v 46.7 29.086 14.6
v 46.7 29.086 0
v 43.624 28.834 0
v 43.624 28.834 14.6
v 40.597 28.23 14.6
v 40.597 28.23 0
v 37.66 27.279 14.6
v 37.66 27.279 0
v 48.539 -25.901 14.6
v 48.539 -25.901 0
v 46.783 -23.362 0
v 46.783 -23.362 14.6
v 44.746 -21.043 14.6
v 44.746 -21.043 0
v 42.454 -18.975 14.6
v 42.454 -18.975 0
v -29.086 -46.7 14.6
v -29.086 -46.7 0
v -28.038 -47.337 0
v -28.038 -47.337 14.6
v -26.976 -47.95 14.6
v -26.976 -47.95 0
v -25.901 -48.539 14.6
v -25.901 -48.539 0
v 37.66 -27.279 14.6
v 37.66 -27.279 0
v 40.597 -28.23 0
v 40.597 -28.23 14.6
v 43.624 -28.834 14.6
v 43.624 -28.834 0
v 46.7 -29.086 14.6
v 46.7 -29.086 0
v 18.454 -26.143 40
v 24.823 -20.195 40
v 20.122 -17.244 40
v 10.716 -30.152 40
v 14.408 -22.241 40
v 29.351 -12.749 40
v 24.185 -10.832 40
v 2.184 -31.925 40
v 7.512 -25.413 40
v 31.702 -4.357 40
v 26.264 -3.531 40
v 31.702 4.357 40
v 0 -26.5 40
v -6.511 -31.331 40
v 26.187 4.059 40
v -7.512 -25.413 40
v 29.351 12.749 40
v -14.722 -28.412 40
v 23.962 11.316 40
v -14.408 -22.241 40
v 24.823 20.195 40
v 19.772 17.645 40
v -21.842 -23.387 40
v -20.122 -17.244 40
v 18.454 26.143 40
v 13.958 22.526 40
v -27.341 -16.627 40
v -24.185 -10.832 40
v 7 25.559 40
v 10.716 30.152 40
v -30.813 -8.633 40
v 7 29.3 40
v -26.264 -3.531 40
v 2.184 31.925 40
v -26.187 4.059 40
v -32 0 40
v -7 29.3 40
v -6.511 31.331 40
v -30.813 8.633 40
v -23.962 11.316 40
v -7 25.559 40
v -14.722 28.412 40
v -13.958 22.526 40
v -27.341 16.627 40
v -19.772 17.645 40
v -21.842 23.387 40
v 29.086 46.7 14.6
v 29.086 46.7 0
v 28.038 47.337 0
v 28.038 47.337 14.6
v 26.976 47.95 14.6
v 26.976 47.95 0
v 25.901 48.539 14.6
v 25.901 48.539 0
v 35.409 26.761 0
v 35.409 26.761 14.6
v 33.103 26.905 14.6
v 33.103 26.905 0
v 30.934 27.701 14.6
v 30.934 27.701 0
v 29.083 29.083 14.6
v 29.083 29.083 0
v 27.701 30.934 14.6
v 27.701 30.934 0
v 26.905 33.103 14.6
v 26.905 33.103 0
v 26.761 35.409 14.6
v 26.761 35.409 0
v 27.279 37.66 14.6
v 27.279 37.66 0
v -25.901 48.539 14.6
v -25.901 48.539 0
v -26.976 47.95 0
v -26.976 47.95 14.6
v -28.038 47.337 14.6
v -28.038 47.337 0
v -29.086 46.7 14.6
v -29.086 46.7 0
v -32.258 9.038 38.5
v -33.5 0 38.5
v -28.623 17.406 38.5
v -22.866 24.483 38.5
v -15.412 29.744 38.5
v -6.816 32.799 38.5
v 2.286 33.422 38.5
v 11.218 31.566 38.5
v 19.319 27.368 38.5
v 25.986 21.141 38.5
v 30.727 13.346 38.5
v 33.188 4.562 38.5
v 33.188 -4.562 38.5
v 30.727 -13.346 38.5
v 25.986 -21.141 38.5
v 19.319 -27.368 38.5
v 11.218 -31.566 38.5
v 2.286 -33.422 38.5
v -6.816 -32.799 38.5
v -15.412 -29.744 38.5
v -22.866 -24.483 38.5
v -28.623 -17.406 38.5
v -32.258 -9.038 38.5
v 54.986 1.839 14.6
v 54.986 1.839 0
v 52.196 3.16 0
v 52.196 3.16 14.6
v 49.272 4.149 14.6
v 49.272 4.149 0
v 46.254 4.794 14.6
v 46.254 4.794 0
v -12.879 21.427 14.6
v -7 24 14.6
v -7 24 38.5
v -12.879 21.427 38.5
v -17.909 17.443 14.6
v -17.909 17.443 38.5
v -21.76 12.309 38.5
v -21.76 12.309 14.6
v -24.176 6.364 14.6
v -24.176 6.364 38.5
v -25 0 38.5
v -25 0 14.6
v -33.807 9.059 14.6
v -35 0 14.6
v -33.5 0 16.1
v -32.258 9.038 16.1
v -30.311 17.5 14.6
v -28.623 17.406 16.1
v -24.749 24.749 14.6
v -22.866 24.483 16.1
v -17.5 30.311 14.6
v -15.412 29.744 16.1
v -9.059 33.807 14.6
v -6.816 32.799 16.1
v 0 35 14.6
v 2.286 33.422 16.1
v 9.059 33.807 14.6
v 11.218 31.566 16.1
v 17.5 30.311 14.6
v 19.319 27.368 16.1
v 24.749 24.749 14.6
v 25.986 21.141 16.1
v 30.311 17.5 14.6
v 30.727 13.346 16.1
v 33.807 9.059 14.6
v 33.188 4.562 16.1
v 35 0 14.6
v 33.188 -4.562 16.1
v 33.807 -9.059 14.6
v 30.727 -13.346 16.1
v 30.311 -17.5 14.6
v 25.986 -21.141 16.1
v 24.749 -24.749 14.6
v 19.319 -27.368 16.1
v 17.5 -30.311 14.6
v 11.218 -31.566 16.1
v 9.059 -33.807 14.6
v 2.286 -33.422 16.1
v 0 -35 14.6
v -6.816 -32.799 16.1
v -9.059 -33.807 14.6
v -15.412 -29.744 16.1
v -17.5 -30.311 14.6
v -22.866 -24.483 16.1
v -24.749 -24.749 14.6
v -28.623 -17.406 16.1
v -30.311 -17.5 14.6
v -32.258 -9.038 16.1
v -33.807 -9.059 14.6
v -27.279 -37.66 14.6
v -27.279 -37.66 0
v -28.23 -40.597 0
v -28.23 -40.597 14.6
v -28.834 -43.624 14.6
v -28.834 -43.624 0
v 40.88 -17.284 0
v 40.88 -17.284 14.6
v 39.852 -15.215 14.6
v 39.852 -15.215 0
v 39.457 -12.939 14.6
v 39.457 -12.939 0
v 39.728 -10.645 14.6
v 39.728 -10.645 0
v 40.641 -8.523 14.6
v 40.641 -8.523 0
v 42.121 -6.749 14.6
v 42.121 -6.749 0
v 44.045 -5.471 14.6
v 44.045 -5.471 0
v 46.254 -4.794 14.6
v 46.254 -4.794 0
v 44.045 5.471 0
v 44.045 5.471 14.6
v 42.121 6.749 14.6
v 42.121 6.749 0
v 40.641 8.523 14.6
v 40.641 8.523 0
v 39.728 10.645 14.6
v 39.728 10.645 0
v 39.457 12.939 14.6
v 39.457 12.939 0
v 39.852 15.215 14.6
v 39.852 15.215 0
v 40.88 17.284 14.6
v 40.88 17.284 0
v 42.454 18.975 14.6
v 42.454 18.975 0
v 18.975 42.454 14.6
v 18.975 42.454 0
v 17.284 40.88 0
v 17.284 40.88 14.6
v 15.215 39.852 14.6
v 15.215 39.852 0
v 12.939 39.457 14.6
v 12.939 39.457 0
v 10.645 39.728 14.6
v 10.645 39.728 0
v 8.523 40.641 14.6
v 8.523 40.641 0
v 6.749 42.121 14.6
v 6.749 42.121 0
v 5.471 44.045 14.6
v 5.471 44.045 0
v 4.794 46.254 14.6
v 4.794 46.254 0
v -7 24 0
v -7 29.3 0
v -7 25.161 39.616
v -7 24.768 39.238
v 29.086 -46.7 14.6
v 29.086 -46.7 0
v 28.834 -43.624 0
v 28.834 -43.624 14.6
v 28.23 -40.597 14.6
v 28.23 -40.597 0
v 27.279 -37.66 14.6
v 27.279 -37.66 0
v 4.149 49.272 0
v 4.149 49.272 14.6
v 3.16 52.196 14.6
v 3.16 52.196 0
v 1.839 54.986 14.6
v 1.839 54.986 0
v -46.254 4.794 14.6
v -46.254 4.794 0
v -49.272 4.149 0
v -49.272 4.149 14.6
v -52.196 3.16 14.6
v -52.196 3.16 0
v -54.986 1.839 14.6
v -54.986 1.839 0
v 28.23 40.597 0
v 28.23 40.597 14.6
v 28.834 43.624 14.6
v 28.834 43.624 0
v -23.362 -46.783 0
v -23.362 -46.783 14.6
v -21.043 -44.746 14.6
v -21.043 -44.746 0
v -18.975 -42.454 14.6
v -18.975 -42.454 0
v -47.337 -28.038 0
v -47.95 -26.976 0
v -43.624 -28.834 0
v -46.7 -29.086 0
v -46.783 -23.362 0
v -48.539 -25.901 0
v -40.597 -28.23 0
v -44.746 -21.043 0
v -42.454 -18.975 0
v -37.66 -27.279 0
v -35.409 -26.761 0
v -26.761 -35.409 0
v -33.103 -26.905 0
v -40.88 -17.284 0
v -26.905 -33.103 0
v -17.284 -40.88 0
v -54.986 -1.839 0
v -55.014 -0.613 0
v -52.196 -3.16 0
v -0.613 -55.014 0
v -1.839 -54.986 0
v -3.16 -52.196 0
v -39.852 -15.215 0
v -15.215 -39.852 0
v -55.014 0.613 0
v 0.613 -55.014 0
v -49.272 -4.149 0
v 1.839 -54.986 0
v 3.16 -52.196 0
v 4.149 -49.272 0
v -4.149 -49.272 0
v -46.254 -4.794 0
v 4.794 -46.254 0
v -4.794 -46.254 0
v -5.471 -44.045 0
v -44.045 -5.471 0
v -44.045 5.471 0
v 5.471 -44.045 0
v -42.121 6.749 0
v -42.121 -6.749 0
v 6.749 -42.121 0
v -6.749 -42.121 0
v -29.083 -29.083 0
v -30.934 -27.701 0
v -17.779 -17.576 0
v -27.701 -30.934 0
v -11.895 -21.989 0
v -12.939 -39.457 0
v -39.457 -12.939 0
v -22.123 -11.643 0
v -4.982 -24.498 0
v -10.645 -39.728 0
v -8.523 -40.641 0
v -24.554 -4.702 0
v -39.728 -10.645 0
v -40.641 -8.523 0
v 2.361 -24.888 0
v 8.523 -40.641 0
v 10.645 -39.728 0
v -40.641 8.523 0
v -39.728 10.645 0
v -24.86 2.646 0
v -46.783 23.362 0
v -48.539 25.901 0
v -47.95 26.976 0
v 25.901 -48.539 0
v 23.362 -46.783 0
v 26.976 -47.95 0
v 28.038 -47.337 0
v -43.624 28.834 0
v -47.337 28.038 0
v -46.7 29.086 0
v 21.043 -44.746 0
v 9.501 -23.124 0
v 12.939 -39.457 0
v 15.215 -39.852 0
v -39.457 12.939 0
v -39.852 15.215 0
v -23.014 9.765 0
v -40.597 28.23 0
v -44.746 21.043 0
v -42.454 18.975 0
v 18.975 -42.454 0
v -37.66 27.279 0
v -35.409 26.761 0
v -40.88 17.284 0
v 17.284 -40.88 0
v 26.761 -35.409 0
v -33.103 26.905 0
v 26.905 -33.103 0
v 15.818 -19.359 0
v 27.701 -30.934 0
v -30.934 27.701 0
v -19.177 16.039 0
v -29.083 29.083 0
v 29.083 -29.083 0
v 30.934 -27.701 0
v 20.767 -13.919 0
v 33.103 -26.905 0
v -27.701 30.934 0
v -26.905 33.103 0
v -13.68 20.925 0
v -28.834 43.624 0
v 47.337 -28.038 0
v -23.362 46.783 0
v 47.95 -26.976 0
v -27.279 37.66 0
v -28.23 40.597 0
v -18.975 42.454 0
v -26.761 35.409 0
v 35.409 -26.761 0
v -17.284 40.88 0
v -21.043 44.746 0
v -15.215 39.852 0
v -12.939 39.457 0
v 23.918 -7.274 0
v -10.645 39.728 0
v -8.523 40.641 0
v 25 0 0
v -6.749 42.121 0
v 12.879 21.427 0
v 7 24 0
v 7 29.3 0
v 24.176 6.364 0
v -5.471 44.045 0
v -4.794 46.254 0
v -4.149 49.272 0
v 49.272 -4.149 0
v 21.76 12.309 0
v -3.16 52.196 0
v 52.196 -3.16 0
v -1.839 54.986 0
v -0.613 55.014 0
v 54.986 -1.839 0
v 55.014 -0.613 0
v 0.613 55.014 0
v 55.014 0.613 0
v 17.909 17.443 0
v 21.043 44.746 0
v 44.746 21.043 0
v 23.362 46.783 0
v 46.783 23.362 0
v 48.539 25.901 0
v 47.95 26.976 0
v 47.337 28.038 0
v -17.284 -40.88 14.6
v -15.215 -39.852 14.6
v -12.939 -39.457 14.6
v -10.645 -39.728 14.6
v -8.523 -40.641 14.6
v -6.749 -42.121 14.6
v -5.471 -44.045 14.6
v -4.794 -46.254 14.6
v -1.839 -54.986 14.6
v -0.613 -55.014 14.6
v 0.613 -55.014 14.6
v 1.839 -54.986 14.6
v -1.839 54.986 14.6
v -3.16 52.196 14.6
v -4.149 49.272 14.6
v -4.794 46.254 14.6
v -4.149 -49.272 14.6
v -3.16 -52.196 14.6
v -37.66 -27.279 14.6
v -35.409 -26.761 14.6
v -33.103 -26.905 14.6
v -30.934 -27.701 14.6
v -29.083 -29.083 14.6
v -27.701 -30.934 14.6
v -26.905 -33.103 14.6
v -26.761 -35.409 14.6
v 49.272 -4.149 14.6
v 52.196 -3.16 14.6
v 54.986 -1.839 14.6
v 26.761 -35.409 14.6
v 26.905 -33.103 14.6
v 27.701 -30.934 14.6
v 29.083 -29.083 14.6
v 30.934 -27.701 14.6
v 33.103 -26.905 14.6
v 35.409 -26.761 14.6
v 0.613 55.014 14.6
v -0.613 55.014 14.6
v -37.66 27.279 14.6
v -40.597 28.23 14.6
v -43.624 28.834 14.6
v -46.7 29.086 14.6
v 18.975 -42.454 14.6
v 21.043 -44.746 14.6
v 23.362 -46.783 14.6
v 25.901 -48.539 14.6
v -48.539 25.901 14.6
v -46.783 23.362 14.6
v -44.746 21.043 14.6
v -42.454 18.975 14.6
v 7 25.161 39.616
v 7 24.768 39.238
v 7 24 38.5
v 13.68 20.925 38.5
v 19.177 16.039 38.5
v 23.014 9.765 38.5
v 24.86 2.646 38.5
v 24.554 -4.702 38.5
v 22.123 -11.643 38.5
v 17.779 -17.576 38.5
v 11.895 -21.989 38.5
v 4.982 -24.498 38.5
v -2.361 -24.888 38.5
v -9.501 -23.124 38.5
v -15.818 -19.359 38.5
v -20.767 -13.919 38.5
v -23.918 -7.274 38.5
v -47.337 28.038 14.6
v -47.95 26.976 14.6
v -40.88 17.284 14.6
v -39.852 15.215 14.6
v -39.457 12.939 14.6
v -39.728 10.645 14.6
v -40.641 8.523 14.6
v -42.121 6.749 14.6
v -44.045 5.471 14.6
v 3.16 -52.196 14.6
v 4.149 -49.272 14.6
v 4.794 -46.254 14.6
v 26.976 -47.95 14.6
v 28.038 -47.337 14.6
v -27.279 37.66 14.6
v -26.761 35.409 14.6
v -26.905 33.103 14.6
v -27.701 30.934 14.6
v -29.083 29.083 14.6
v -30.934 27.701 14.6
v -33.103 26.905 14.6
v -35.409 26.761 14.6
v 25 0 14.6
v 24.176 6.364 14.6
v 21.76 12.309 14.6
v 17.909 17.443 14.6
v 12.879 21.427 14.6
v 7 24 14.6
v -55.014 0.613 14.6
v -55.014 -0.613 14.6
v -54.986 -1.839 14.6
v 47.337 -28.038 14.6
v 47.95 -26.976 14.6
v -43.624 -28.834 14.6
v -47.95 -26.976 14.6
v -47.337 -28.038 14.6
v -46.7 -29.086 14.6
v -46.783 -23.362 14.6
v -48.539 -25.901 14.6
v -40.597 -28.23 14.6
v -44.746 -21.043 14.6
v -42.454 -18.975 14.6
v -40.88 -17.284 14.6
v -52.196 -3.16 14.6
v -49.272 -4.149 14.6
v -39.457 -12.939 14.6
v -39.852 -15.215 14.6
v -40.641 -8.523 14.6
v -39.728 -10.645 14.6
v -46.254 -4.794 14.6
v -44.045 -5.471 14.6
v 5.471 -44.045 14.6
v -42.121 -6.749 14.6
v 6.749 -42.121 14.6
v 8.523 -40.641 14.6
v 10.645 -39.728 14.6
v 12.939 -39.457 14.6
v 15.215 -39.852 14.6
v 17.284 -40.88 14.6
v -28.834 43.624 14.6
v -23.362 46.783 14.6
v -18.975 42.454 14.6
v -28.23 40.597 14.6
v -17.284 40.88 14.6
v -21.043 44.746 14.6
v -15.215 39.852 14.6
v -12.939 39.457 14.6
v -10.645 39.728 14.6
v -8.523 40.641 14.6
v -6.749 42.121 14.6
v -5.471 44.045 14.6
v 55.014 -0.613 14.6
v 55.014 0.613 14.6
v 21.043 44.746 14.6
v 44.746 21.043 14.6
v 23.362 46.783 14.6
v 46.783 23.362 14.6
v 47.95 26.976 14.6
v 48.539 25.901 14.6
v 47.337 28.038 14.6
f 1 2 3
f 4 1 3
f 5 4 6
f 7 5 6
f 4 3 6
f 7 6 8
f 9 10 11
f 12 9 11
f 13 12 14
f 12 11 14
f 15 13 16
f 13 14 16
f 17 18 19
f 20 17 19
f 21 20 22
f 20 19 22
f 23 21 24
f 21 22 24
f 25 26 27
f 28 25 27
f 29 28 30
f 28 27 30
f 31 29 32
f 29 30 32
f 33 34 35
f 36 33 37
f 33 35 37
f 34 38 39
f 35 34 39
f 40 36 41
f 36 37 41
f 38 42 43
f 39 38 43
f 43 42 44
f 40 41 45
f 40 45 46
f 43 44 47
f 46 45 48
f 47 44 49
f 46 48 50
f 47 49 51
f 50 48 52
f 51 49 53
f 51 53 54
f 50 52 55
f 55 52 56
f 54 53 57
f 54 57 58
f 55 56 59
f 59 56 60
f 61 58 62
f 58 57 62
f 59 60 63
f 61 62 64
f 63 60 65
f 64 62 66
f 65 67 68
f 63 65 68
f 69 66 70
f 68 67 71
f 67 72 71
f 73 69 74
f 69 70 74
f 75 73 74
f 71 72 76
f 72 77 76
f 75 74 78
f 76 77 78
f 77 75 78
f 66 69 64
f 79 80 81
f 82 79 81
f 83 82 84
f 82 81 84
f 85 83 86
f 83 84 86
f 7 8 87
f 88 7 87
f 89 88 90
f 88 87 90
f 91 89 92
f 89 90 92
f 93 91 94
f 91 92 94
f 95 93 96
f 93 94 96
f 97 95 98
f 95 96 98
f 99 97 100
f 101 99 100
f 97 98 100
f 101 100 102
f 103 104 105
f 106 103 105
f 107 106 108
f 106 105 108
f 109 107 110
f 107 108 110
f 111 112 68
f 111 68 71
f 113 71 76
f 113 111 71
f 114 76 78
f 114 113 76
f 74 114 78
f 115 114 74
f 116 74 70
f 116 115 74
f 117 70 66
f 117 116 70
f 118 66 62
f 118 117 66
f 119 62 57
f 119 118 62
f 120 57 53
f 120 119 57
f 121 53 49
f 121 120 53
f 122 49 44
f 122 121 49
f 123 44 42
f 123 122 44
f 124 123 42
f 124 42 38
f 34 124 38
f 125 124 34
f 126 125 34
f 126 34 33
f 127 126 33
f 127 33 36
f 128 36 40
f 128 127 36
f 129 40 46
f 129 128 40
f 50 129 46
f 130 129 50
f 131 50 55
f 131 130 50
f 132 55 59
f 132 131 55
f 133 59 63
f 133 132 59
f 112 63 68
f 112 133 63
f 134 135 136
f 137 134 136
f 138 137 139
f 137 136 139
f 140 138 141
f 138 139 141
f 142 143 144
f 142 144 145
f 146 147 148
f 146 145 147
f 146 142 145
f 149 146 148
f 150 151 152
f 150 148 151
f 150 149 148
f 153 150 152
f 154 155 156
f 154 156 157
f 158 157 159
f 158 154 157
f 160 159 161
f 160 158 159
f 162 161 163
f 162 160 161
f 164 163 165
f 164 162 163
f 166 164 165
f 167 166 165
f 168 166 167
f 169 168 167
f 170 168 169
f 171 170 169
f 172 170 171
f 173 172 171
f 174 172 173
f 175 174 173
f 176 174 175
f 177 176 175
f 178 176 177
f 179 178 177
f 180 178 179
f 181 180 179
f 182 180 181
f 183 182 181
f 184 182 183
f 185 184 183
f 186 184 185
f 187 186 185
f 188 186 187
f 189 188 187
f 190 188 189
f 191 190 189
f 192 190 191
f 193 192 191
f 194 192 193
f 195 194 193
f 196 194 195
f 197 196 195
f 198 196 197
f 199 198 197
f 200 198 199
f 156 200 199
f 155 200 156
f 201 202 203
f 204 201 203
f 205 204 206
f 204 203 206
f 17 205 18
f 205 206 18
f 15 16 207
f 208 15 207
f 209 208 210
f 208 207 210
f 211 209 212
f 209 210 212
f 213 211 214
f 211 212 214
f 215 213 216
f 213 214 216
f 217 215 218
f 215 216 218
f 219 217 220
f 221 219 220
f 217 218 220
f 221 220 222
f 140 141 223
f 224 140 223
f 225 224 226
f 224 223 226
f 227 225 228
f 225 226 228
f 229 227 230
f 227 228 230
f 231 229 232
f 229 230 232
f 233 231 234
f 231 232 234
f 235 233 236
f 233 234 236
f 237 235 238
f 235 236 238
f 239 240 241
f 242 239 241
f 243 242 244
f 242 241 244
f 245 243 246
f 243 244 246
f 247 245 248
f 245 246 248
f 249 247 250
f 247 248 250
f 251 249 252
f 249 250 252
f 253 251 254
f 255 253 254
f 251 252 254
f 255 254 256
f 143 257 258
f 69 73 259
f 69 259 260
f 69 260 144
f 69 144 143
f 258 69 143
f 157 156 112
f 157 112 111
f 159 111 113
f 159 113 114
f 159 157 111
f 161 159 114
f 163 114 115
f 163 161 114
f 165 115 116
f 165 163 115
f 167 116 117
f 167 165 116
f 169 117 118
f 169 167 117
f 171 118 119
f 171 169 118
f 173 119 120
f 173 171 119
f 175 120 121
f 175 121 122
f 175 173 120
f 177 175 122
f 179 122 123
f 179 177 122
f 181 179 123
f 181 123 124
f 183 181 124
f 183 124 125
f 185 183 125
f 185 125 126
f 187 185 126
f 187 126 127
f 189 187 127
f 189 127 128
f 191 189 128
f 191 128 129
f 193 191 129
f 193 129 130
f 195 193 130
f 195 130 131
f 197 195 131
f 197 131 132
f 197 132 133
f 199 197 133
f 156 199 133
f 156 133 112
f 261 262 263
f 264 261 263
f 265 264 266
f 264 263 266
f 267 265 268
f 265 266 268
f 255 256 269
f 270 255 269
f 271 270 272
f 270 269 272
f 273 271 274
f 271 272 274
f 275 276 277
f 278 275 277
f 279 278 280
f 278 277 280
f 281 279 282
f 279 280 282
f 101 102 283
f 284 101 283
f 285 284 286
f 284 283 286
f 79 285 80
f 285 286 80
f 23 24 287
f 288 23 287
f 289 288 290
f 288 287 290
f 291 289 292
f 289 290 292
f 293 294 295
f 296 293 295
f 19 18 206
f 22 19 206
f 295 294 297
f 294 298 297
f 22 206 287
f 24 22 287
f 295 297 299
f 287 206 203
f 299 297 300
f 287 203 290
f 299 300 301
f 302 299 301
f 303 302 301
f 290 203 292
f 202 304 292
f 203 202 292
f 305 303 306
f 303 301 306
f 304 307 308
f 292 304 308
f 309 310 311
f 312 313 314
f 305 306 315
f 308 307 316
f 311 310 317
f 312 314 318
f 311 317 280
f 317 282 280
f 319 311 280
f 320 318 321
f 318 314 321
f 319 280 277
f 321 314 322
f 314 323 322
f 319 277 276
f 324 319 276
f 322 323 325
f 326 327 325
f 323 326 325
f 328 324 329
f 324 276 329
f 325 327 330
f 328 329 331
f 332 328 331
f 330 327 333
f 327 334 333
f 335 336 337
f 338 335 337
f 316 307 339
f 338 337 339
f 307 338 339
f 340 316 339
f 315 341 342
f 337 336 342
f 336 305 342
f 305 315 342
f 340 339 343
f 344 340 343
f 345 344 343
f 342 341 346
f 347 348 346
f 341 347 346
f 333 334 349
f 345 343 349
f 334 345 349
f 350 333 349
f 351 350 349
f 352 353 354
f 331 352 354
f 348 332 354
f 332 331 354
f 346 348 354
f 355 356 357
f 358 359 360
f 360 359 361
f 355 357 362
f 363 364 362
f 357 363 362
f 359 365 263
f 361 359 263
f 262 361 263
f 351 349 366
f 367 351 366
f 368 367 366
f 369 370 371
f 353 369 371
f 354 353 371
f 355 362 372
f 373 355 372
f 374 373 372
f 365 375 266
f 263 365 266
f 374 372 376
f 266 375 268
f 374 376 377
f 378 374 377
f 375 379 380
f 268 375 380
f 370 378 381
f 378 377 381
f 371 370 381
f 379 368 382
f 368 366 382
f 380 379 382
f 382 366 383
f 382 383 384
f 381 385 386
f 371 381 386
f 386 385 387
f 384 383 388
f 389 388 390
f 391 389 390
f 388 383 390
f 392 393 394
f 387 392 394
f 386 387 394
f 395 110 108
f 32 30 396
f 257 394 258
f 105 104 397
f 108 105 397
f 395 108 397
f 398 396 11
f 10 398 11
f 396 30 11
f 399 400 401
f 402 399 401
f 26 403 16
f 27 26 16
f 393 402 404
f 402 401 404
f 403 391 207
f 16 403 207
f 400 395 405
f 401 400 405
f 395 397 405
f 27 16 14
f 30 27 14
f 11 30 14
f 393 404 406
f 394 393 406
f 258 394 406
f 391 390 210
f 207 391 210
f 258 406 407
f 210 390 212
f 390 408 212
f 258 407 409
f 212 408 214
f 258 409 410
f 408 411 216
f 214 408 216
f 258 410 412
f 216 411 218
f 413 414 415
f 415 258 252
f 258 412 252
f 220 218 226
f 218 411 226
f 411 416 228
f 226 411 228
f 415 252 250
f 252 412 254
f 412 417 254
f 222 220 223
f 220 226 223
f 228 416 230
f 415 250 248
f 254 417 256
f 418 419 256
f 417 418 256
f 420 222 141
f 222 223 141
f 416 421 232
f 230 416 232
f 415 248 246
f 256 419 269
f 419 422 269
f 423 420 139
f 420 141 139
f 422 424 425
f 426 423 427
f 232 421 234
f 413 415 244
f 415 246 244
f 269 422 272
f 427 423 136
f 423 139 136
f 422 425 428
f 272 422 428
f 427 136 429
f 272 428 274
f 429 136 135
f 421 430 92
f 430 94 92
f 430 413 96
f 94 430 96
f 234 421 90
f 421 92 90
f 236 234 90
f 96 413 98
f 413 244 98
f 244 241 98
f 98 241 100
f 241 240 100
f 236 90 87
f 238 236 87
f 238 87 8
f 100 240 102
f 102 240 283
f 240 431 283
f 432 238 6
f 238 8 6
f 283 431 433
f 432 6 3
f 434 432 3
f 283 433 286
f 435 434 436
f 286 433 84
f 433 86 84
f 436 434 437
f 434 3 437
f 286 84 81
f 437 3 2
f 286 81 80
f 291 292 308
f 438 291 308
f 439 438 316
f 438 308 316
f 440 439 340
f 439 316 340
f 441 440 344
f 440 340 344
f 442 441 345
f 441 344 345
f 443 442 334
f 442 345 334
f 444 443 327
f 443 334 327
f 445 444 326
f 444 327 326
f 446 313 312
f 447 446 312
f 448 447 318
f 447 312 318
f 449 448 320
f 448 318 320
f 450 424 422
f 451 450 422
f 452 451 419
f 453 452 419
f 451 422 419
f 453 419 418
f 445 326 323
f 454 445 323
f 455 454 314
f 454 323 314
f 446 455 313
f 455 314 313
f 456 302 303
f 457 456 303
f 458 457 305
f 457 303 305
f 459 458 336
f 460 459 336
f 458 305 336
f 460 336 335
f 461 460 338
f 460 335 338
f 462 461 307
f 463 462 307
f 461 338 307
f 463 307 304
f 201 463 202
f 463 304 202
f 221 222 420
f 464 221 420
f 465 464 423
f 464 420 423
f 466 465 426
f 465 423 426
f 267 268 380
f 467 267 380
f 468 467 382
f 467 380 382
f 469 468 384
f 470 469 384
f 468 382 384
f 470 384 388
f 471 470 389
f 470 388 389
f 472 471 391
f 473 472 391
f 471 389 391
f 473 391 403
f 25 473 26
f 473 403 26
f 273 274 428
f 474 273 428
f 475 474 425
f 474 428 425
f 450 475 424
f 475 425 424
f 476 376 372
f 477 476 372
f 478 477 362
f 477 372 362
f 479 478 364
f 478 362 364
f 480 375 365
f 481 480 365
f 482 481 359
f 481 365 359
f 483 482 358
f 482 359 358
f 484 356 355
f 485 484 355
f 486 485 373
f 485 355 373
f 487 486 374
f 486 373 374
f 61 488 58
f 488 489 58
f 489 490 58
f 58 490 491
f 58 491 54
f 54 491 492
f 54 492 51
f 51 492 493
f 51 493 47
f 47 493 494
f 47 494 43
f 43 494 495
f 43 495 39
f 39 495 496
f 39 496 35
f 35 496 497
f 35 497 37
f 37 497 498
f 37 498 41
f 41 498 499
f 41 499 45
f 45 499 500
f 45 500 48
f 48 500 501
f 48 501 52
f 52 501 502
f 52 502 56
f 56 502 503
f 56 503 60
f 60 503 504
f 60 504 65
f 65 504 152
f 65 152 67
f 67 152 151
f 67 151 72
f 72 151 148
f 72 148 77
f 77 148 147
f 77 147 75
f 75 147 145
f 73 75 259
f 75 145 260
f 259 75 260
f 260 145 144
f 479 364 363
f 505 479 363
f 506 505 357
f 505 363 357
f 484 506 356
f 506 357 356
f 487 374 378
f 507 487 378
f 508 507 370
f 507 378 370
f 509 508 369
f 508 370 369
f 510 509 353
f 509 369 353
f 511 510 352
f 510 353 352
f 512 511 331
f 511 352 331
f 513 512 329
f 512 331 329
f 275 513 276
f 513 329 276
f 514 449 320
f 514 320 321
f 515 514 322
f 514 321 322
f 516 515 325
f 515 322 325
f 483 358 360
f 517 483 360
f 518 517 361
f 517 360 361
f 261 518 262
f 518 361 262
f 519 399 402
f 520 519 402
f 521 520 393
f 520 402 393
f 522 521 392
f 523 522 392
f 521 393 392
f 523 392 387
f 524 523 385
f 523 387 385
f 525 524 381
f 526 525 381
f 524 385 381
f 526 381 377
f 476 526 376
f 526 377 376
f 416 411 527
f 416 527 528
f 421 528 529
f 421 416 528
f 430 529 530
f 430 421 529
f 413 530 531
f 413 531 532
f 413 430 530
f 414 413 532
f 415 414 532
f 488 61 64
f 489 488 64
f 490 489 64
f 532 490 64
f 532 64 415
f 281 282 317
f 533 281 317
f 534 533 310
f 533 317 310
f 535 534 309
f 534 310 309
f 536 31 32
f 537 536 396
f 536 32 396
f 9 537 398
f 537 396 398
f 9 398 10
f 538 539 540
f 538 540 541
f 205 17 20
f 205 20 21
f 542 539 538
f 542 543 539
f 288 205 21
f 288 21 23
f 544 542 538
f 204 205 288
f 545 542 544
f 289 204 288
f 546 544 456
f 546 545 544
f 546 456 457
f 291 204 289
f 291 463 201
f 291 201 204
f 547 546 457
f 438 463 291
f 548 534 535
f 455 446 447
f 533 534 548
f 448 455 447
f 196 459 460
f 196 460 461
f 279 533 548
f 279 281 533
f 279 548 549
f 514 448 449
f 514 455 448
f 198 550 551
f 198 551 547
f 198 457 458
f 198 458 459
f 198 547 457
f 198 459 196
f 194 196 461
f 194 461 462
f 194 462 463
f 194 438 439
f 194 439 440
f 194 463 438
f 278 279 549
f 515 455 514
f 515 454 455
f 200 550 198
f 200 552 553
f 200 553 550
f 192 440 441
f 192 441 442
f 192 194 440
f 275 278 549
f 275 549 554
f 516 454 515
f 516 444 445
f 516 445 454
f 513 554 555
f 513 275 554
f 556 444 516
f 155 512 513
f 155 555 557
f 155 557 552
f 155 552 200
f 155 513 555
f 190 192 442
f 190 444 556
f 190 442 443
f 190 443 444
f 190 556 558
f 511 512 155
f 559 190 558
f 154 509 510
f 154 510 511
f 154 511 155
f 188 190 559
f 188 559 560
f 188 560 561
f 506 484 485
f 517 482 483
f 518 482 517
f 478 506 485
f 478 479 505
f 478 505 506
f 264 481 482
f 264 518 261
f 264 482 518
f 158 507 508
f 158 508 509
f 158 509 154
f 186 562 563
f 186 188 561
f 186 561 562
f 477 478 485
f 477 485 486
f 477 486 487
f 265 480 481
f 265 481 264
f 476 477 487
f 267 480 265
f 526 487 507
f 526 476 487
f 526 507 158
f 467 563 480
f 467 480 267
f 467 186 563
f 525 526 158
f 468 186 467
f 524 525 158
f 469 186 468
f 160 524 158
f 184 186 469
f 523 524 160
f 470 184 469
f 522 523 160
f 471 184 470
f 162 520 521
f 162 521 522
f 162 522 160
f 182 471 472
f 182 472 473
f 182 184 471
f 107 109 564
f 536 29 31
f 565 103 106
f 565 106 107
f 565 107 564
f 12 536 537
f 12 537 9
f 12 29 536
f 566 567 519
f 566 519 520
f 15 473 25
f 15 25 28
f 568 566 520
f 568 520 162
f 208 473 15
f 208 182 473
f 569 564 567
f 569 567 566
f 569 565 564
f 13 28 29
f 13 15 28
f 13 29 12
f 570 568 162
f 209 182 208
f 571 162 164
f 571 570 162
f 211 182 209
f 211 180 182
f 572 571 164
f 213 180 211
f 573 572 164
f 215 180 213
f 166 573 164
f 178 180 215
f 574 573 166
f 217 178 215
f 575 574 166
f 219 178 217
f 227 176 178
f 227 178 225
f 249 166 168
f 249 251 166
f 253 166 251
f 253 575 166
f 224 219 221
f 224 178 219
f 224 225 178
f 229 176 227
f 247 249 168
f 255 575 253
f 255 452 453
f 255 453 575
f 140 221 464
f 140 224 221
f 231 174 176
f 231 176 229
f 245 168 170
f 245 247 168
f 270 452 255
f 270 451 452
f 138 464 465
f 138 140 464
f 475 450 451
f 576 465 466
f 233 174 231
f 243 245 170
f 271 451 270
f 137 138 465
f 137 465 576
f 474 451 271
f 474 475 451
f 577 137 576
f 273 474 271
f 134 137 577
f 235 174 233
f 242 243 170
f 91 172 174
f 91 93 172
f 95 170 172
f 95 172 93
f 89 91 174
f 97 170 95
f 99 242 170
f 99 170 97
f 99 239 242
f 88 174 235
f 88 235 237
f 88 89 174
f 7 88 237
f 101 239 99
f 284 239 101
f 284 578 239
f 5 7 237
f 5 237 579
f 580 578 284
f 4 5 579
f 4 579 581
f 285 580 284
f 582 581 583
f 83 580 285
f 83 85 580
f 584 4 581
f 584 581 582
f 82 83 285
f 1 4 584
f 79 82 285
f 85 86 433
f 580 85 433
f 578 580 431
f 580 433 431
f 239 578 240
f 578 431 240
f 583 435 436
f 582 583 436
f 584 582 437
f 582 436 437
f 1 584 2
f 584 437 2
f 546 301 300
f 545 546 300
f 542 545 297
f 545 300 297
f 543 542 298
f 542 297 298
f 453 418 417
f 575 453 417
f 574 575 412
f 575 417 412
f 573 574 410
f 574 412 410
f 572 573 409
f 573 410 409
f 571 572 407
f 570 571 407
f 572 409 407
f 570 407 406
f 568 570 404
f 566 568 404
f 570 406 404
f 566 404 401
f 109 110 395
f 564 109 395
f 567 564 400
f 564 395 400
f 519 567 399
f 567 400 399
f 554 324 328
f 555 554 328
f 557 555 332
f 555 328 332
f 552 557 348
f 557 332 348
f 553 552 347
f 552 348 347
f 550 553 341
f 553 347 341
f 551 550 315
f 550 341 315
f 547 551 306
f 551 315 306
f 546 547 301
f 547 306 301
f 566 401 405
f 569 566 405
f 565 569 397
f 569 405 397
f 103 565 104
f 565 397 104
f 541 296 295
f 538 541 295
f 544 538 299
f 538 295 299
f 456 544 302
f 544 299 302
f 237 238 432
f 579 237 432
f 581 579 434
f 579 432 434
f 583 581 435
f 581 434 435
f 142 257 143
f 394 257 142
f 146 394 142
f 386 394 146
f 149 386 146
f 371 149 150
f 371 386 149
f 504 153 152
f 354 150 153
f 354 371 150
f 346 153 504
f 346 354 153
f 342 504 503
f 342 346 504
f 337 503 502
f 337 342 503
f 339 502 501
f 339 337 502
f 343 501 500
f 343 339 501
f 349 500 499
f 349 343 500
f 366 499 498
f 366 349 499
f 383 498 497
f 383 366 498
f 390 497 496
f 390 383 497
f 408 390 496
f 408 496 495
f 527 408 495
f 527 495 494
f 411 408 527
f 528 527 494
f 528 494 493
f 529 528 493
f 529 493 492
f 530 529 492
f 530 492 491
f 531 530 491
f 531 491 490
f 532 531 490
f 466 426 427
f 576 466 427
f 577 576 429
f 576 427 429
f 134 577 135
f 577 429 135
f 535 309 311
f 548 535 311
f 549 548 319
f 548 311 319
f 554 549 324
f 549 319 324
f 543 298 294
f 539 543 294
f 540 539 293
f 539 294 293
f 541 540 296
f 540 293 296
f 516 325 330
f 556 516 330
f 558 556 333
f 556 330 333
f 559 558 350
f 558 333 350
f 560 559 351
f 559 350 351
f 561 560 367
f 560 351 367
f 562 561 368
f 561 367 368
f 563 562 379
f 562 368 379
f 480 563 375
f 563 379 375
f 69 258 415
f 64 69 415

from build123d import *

# Parameters (mm, degrees)
SKETCH2_R           = 25
BOSS_EXTRUDE1_DEPTH = 14.6
SKETCH3_R           = 33.5
SKETCH3_R_2         = 25
BOSS_EXTRUDE2_DEPTH = 40
SKETCH6_W           = 14
SKETCH6_H           = 12
CUT_EXTRUDE1_DEPTH  = 64
CHAMFER1_SIZE       = 1.5


with BuildPart() as part:
    # Sketch2 → Boss-Extrude1 (new body)
    with BuildSketch(Plane.XY):
        with BuildLine():
            ThreePointArc((-18.974755856, 42.454209074), (-22.172929883, 45.798002784), (-25.900754962, 48.538913885))
            ThreePointArc((-25.900754962, 48.538913885), (-27.508522628, 47.646158833), (-29.085555016, 46.700168716))
            ThreePointArc((-29.085555016, 46.700168716), (-28.575768912, 42.101321947), (-27.279045628, 37.659725139))
            ThreePointArc((-27.279045628, 37.659725139), (-29.082617414, 29.082617413), (-37.659725139, 27.279045628))
            ThreePointArc((-37.659725139, 27.279045628), (-42.101321947, 28.575768912), (-46.700168717, 29.085555016))
            ThreePointArc((-46.700168717, 29.085555016), (-47.646158833, 27.508522628), (-48.538913885, 25.900754962))
            ThreePointArc((-48.538913885, 25.900754962), (-45.798002784, 22.172929883), (-42.454209074, 18.974755856))
            ThreePointArc((-42.454209074, 18.974755856), (-39.727594195, 10.644976782), (-46.253801484, 4.794483935))
            ThreePointArc((-46.253801484, 4.794483935), (-50.748698795, 3.696680837), (-54.986309977, 1.838745168))
            ThreePointArc((-54.986309977, 1.838745168), (-55.017045256, 0), (-54.986309977, -1.838745169))
            ThreePointArc((-54.986309977, -1.838745169), (-50.748698795, -3.696680837), (-46.253801484, -4.794483935))
            ThreePointArc((-46.253801484, -4.794483935), (-39.727594195, -10.644976782), (-42.454209074, -18.974755856))
            ThreePointArc((-42.454209074, -18.974755856), (-45.798002784, -22.172929883), (-48.538913885, -25.900754962))
            ThreePointArc((-48.538913885, -25.900754962), (-47.646158833, -27.508522628), (-46.700168717, -29.085555016))
            ThreePointArc((-46.700168717, -29.085555016), (-42.101321947, -28.575768912), (-37.659725139, -27.279045628))
            ThreePointArc((-37.659725139, -27.279045628), (-29.082617413, -29.082617414), (-27.279045628, -37.659725139))
            ThreePointArc((-27.279045628, -37.659725139), (-28.575768912, -42.101321947), (-29.085555016, -46.700168717))
            ThreePointArc((-29.085555016, -46.700168717), (-27.508522628, -47.646158833), (-25.900754962, -48.538913885))
            ThreePointArc((-25.900754962, -48.538913885), (-22.172929883, -45.798002784), (-18.974755856, -42.454209074))
            ThreePointArc((-18.974755856, -42.454209074), (-10.644976782, -39.727594195), (-4.794483935, -46.253801484))
            ThreePointArc((-4.794483935, -46.253801484), (-3.696680837, -50.748698795), (-1.838745168, -54.986309977))
            ThreePointArc((-1.838745168, -54.986309977), (0, -55.017045256), (1.838745168, -54.986309977))
            ThreePointArc((1.838745168, -54.986309977), (3.696680837, -50.748698795), (4.794483935, -46.253801484))
            ThreePointArc((4.794483935, -46.253801484), (10.644976782, -39.727594195), (18.974755856, -42.454209074))
            ThreePointArc((18.974755856, -42.454209074), (22.172929883, -45.798002784), (25.900754962, -48.538913885))
            ThreePointArc((25.900754962, -48.538913885), (27.508522628, -47.646158833), (29.085555016, -46.700168716))
            ThreePointArc((29.085555016, -46.700168716), (28.575768912, -42.101321947), (27.279045628, -37.659725139))
            ThreePointArc((27.279045628, -37.659725139), (29.082617413, -29.082617414), (37.659725139, -27.279045628))
            ThreePointArc((37.659725139, -27.279045628), (42.101321947, -28.575768912), (46.700168716, -29.085555016))
            ThreePointArc((46.700168716, -29.085555016), (47.646158833, -27.508522628), (48.538913885, -25.900754962))
            ThreePointArc((48.538913885, -25.900754962), (45.798002784, -22.172929883), (42.454209074, -18.974755856))
            ThreePointArc((42.454209074, -18.974755856), (39.727594195, -10.644976782), (46.253801483, -4.794483935))
            ThreePointArc((46.253801483, -4.794483935), (50.748698795, -3.696680837), (54.986309977, -1.838745168))
            ThreePointArc((54.986309977, -1.838745168), (55.017045256, 0), (54.986309977, 1.838745169))
            ThreePointArc((54.986309977, 1.838745169), (50.748698795, 3.696680837), (46.253801484, 4.794483935))
            ThreePointArc((46.253801484, 4.794483935), (39.727594195, 10.644976782), (42.454209074, 18.974755856))
            ThreePointArc((42.454209074, 18.974755856), (45.798002784, 22.172929883), (48.538913885, 25.900754962))
            ThreePointArc((48.538913885, 25.900754962), (47.646158833, 27.508522628), (46.700168717, 29.085555015))
            ThreePointArc((46.700168717, 29.085555015), (42.101321947, 28.575768912), (37.659725139, 27.279045628))
            ThreePointArc((37.659725139, 27.279045628), (29.082617413, 29.082617413), (27.279045628, 37.659725139))
            ThreePointArc((27.279045628, 37.659725139), (28.575768912, 42.101321947), (29.085555016, 46.700168717))
            ThreePointArc((29.085555016, 46.700168717), (27.508522628, 47.646158833), (25.900754962, 48.538913885))
            ThreePointArc((25.900754962, 48.538913885), (22.172929883, 45.798002784), (18.974755856, 42.454209074))
            ThreePointArc((18.974755856, 42.454209074), (10.644976782, 39.727594195), (4.794483935, 46.253801483))
            ThreePointArc((4.794483935, 46.253801483), (3.696680837, 50.748698795), (1.838745168, 54.986309977))
            ThreePointArc((1.838745168, 54.986309977), (0, 55.017045256), (-1.838745168, 54.986309977))
            ThreePointArc((-1.838745168, 54.986309977), (-3.696680837, 50.748698795), (-4.794483935, 46.253801483))
            ThreePointArc((-4.794483935, 46.253801483), (-10.644976782, 39.727594195), (-18.974755856, 42.454209074))
        make_face()
        Circle(SKETCH2_R, mode=Mode.SUBTRACT)
    extrude(amount=BOSS_EXTRUDE1_DEPTH)

    # Sketch3 → Boss-Extrude2 (add)
    with BuildSketch(Plane(origin=(0, 0, 0), x_dir=(-1, 0, 0), z_dir=(0, 0, -1))):
        Circle(SKETCH3_R)
        Circle(SKETCH3_R_2, mode=Mode.SUBTRACT)
    extrude(amount=-BOSS_EXTRUDE2_DEPTH)

    # Sketch6 → Cut-Extrude1 (cut)
    with BuildSketch(Plane.XY.offset(40)):
        with Locations((0, 23.3)):
            Rectangle(SKETCH6_W, SKETCH6_H)
    extrude(amount=-CUT_EXTRUDE1_DEPTH, mode=Mode.SUBTRACT)

    # Chamfer1
    chamfer1_edges = [part.edges().sort_by_distance(p)[0] for p in [
        (33.5, 0, 14.6),
        (33.5, 0, 40),
        (15, -20, 40),
    ]]
    chamfer(chamfer1_edges, length=CHAMFER1_SIZE)


solid = part.part
